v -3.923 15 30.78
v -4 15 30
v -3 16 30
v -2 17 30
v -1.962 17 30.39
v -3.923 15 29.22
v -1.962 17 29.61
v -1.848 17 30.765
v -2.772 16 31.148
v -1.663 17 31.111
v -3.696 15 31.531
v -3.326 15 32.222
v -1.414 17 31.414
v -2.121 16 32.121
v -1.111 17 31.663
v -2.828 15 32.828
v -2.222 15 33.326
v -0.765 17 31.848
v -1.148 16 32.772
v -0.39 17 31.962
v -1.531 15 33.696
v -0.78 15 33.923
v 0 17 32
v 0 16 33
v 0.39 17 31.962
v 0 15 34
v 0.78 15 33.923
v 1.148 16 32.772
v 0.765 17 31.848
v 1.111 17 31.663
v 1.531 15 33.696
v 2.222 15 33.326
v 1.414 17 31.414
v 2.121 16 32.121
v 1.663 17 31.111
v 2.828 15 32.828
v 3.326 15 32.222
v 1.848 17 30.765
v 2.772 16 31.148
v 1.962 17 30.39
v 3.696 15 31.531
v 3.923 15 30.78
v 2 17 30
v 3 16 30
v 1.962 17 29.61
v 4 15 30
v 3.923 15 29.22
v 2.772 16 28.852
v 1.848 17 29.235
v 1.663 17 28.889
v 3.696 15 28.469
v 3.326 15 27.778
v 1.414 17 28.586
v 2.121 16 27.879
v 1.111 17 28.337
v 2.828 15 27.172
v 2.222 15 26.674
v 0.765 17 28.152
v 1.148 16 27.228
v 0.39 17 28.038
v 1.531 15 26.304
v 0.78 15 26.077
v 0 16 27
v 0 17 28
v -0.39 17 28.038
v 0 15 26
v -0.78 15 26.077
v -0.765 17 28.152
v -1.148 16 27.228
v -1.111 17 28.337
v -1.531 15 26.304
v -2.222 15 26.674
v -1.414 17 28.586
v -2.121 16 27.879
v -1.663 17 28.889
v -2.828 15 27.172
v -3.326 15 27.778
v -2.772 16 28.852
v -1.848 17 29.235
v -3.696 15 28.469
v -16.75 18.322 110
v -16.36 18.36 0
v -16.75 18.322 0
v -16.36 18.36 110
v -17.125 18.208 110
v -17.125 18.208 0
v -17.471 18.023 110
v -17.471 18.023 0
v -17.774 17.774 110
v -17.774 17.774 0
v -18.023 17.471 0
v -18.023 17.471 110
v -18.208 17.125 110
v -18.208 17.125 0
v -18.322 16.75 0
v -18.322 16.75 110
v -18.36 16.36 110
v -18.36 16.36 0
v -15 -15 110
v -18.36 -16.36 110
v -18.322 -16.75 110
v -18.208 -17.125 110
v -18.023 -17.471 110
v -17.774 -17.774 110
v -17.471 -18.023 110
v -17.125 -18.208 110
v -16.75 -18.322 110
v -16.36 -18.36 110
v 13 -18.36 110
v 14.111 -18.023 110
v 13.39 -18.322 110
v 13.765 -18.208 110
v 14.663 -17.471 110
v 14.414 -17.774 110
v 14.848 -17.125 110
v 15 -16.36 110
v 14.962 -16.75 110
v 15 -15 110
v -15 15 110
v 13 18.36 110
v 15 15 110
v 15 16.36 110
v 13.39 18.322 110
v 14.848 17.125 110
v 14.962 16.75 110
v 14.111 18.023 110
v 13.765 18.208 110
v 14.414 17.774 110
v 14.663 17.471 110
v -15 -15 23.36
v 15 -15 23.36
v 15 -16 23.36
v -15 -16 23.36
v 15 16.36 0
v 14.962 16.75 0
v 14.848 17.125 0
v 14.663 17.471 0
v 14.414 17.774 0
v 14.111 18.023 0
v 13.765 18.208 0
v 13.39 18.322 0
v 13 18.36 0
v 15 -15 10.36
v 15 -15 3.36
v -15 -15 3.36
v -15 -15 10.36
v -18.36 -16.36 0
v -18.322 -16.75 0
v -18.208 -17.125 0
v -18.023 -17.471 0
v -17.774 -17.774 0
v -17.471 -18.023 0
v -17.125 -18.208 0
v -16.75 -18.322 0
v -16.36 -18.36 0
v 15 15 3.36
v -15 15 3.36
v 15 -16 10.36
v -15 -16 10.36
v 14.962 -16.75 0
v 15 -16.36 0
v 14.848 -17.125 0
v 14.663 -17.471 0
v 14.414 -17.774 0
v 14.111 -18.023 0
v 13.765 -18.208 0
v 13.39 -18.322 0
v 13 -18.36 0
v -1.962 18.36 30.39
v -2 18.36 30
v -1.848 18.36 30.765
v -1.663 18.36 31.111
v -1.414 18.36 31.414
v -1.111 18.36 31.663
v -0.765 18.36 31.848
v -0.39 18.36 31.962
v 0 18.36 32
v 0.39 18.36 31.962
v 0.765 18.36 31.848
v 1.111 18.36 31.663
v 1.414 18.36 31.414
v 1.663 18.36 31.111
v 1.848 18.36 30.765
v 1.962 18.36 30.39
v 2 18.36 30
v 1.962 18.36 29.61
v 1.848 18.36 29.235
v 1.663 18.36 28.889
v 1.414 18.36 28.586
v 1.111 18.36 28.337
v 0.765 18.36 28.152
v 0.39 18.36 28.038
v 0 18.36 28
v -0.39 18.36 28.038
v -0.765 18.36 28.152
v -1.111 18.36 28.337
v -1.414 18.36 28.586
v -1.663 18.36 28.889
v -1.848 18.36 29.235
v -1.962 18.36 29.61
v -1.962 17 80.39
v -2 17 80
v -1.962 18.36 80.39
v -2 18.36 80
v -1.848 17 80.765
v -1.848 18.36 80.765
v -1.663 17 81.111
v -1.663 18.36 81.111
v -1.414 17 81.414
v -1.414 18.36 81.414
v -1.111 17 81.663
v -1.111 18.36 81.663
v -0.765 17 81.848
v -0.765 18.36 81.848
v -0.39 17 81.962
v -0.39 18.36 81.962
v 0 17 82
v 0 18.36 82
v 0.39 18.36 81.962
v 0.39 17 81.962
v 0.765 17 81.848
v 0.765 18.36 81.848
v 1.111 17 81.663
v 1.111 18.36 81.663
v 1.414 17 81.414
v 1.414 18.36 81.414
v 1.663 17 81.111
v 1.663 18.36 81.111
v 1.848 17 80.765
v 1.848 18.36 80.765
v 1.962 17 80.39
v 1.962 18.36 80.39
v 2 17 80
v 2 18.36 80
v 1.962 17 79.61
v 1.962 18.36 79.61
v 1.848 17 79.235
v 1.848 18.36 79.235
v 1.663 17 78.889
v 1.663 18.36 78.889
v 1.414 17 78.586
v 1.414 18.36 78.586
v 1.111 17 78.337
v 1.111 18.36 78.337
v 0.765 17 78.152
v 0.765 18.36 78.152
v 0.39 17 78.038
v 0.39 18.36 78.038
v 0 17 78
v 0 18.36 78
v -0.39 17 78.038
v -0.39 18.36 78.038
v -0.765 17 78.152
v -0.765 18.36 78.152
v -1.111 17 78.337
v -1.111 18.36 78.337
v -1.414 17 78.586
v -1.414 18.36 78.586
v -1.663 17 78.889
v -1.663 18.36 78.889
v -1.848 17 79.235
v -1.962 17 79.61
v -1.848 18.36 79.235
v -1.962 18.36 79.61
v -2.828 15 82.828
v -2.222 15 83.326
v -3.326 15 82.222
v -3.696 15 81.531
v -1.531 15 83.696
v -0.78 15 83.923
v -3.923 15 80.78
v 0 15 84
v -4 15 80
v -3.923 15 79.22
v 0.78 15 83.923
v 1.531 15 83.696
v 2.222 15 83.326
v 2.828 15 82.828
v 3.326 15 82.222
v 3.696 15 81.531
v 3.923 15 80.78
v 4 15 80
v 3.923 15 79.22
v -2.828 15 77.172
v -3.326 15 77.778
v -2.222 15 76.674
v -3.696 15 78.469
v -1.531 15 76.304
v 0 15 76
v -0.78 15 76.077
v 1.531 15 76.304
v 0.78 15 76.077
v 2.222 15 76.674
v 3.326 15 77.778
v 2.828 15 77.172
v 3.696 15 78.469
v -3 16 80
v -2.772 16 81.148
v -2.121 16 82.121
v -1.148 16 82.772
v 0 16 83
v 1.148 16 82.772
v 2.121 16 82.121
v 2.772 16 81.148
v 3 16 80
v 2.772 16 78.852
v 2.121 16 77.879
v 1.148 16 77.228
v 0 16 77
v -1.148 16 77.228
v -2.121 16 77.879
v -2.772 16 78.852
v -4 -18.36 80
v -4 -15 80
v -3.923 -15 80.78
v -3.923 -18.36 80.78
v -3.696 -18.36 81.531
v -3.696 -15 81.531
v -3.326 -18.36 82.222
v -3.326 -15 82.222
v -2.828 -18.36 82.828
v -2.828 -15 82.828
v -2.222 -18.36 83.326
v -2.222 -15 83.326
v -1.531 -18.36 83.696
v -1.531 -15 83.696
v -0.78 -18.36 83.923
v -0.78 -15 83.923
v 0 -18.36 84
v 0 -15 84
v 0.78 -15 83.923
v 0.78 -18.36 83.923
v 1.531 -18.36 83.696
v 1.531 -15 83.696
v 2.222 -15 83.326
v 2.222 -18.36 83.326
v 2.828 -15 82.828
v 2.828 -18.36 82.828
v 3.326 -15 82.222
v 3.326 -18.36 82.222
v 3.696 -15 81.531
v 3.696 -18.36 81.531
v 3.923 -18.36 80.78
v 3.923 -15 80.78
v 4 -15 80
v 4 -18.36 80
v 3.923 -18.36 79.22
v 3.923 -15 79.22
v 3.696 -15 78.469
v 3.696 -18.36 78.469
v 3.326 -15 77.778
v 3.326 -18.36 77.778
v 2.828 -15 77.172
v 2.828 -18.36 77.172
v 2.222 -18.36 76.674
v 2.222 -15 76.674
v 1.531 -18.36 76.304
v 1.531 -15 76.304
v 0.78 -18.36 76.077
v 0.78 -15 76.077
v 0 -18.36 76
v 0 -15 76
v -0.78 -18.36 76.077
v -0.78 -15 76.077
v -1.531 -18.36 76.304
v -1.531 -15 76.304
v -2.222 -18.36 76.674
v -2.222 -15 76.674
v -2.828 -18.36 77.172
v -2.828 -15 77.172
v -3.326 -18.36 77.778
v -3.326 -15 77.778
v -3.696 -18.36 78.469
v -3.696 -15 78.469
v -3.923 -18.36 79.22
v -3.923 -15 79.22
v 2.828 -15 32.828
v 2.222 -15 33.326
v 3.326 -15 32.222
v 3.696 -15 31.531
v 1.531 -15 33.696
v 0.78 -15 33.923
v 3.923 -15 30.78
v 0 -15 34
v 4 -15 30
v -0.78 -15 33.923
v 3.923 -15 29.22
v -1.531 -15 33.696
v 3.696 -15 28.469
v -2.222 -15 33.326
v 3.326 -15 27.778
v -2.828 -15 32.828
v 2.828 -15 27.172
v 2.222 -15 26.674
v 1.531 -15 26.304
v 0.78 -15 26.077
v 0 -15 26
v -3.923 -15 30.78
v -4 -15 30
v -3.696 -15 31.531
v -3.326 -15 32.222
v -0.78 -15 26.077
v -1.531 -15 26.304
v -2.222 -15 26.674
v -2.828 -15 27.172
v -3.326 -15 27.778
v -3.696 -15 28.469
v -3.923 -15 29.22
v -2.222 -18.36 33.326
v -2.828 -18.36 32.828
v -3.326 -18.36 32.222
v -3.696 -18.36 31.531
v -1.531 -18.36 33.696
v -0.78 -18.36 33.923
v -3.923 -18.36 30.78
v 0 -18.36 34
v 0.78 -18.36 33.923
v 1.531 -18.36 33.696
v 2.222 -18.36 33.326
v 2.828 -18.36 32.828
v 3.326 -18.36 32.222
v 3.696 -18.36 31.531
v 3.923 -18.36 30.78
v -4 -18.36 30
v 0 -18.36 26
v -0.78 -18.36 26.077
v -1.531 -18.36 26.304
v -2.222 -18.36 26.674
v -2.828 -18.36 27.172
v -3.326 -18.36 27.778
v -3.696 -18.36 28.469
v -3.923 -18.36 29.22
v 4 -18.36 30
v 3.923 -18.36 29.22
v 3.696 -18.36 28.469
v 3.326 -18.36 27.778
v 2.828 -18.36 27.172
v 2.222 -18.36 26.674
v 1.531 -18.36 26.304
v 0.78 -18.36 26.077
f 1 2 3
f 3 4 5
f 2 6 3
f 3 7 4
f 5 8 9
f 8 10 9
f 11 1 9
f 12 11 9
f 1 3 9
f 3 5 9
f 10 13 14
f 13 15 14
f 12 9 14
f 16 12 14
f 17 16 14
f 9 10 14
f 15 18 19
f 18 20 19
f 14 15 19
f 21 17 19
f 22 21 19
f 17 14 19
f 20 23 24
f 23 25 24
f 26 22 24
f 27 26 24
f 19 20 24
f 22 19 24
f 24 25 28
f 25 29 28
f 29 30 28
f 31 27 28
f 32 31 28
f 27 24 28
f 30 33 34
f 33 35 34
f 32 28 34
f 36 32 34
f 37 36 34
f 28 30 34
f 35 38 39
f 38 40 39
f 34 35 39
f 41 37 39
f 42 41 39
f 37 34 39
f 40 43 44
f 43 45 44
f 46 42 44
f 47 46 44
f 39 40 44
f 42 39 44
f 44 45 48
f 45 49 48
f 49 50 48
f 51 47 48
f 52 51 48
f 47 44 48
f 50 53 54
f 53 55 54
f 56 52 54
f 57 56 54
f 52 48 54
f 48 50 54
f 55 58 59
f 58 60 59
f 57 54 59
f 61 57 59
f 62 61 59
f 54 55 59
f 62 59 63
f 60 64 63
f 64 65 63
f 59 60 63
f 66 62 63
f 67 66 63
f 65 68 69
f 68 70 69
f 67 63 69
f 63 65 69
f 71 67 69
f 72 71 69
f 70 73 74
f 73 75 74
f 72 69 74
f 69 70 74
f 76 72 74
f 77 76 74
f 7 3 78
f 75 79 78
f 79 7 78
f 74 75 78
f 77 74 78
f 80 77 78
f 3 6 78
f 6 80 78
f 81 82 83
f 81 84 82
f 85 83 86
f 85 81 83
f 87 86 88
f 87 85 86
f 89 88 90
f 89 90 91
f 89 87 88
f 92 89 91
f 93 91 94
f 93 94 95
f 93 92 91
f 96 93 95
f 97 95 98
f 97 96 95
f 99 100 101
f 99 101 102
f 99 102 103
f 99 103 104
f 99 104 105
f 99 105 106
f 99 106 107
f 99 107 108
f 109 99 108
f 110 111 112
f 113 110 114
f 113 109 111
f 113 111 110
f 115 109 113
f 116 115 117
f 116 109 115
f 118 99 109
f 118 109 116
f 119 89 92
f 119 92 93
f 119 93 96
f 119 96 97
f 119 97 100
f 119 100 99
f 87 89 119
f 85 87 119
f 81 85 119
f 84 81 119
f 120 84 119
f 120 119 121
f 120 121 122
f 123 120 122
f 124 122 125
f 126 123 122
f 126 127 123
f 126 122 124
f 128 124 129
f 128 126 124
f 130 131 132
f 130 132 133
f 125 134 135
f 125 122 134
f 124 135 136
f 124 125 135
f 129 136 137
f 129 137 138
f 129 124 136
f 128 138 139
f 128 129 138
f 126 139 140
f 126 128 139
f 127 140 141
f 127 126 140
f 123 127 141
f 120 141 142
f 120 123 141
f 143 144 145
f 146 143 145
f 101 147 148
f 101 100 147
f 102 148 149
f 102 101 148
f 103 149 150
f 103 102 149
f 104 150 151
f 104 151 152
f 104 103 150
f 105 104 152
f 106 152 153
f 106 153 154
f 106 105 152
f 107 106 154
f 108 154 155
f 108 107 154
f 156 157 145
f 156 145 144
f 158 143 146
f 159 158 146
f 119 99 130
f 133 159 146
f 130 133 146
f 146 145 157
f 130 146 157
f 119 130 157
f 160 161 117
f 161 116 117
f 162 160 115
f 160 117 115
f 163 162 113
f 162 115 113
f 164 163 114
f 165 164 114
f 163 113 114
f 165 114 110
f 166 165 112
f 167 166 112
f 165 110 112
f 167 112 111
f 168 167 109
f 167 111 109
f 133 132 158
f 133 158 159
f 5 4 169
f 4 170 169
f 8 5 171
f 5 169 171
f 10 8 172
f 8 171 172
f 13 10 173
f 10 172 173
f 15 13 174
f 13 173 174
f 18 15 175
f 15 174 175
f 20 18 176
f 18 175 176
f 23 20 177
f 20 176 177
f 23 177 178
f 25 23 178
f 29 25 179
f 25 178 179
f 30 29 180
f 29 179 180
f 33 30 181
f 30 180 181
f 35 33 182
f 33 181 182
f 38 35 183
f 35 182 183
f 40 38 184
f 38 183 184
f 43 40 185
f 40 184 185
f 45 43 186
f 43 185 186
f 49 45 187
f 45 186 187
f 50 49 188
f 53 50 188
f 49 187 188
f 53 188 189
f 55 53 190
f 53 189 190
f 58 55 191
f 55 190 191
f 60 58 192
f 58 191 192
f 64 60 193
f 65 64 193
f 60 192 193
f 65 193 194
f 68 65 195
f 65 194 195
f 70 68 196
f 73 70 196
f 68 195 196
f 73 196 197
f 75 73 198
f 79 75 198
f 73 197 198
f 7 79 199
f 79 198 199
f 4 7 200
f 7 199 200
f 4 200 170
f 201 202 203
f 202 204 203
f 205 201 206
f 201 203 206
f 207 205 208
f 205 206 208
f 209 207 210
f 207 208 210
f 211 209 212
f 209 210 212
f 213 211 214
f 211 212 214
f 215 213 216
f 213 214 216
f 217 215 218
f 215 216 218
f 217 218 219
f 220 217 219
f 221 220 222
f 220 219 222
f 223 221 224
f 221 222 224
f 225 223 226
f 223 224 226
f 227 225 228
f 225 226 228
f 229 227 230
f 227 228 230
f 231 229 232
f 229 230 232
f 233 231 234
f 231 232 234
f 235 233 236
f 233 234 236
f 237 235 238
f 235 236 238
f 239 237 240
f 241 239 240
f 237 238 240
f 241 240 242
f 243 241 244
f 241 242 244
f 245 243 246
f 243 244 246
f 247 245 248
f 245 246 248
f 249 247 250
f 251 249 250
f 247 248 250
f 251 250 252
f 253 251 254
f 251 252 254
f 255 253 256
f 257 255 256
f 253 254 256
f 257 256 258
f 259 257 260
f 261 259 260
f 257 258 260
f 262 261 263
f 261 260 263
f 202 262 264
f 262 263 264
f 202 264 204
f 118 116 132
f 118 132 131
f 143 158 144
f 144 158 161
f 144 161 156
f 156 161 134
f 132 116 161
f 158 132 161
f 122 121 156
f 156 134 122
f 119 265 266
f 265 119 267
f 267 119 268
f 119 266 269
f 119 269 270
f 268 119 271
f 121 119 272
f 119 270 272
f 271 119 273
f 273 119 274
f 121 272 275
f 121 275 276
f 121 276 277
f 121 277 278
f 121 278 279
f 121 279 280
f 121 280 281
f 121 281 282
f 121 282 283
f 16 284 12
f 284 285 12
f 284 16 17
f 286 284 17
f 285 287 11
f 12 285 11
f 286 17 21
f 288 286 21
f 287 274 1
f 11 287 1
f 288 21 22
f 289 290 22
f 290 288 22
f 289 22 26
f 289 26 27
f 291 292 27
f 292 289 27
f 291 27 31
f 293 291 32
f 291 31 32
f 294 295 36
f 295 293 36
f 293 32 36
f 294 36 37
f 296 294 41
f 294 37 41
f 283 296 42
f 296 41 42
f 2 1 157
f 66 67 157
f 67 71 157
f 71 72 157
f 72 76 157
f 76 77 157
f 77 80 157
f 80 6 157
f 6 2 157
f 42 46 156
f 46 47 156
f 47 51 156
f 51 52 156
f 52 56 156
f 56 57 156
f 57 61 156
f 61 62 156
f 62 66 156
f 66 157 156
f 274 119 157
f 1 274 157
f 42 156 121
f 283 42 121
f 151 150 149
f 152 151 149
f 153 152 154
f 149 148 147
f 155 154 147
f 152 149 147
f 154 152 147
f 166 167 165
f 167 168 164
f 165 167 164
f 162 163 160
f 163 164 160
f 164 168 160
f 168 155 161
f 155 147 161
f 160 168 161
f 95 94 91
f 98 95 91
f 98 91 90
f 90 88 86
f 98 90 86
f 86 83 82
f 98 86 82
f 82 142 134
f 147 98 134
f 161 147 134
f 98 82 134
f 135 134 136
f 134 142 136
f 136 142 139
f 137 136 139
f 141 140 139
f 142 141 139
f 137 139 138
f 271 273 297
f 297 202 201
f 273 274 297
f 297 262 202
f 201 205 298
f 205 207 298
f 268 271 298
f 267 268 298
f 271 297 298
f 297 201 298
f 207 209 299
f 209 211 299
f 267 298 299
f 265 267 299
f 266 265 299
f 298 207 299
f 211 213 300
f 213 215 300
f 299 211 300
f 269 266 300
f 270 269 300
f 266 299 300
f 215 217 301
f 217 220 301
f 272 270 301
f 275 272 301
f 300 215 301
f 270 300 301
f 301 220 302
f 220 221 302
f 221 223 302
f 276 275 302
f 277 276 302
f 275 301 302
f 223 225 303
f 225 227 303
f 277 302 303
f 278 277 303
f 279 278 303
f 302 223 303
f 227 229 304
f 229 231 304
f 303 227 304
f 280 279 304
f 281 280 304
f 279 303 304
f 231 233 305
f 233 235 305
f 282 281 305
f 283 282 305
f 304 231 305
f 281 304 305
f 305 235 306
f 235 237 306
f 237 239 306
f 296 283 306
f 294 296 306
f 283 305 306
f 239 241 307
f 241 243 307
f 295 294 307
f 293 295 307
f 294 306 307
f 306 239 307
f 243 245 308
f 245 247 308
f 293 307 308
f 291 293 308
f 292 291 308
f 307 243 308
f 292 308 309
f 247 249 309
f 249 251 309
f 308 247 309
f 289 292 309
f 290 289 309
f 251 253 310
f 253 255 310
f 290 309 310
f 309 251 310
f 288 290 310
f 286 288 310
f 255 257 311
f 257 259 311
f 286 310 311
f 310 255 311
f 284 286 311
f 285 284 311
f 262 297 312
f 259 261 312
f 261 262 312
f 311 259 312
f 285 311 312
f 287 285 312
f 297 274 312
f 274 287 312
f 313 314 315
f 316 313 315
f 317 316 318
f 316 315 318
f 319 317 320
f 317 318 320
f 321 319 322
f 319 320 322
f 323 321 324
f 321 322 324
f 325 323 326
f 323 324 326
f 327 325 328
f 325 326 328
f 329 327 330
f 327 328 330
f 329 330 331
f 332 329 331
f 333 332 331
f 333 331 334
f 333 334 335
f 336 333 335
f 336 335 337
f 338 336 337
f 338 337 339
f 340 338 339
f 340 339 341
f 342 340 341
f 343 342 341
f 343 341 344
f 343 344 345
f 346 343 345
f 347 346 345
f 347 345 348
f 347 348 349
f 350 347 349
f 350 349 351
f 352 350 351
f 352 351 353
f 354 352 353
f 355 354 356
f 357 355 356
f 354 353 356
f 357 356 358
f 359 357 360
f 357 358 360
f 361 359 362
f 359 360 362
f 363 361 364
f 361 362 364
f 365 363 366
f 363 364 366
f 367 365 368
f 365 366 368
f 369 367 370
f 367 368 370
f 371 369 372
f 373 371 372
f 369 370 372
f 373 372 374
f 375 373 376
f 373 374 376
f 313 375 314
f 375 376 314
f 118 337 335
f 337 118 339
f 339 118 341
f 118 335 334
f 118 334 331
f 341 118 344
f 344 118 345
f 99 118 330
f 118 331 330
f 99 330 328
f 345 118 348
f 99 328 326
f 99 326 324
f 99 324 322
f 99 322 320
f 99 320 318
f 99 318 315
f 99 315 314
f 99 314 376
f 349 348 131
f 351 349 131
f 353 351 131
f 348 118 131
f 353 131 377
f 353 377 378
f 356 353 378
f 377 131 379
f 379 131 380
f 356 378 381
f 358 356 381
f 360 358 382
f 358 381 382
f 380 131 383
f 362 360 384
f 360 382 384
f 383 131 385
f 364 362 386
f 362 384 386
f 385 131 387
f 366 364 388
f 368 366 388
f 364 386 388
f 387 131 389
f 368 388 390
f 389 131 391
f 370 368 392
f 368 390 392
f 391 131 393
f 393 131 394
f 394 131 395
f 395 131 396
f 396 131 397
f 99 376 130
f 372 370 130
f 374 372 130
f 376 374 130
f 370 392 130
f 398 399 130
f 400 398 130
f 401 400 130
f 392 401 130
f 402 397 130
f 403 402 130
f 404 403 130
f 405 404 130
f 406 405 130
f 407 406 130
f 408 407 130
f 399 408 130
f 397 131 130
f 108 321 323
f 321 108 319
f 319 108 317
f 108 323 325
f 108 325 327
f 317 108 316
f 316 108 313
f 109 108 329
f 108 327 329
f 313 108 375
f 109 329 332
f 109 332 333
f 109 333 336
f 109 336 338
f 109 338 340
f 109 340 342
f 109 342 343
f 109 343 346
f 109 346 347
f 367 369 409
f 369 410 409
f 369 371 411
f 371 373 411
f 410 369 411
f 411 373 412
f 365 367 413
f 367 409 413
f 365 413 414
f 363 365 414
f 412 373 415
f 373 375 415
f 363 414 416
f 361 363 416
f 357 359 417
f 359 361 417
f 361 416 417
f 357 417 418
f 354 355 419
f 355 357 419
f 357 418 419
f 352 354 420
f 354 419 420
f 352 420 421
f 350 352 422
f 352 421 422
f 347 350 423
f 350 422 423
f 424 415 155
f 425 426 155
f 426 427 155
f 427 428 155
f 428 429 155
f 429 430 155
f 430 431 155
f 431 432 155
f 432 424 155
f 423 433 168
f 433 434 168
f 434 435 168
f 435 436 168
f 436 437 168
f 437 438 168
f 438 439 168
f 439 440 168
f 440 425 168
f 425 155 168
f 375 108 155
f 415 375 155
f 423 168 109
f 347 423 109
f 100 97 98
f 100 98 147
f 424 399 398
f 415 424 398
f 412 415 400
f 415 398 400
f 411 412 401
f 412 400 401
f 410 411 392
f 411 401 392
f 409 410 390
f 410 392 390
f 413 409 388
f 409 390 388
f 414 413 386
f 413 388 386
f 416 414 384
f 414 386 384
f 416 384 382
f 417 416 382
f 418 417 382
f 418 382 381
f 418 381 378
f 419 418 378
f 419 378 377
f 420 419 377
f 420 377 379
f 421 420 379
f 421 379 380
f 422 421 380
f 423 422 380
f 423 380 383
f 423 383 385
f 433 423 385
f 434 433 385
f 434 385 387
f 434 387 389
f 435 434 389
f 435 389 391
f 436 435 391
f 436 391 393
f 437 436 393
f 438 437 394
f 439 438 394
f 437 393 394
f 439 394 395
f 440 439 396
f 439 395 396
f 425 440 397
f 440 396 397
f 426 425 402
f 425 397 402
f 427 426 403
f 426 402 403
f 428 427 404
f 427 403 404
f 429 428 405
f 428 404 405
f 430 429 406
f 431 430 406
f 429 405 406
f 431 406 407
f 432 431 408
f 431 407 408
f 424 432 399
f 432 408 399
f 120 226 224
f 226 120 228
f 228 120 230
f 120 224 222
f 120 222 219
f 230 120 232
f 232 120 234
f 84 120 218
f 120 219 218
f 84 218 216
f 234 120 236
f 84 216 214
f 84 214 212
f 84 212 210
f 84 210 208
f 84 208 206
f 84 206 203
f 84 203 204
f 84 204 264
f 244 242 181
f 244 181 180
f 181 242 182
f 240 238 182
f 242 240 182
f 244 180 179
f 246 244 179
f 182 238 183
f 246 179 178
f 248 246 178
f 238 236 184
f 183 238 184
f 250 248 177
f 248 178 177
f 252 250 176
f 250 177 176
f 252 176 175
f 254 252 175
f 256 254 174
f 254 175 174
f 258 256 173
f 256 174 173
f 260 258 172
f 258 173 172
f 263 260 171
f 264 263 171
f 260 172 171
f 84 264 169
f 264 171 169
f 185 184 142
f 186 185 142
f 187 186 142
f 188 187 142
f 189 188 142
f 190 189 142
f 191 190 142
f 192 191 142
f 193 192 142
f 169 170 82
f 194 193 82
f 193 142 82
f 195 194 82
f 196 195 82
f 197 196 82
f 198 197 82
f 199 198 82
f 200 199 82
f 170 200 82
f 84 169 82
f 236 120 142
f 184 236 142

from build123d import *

# Parameters (mm, degrees)
F1_DEPTH       = 110
F0_W           = 30
F0_H           = 30
F2_DEPTH       = 3.36
F3_R           = 2
F5_D           = 8
F5_DEPTH       = 4
F7_D           = 4
F7_DEPTH       = 4
F7_CSINK_D     = 8
F7_CSINK_ANGLE = 90
F8_W           = 30
F8_H           = 13
F9_DEPTH       = 1


with BuildPart() as f1:
    # F0 (on Top) → F1 (new body)
    with BuildSketch(Plane.XY):
        Polygon((15, -18.36), (15, -15), (-15, -15), (-15, 15), (15, 15), (15, 18.36), (-18.36, 18.36), (-18.36, -18.36), align=None)
    extrude(amount=F1_DEPTH)

    # F0 (on Top) → F2 (join)
    with BuildSketch(Plane.XY):
        Rectangle(F0_W, F0_H)
    extrude(amount=F2_DEPTH)

    # F3
    f3_edges = [f1.edges().sort_by_distance(p)[0] for p in [
        (-18.36, -18.36, 55),
        (-18.36, 18.36, 55),
        (15, -18.36, 55),
        (15, 18.36, 55),
    ]]
    fillet(f3_edges, radius=F3_R)

    # F5
    with Locations(Plane.XZ.offset(18.36)):
        with Locations((0, 30), (0, 80)):
            Hole(F5_D / 2, depth=F5_DEPTH)

    # F7
    with Locations(Plane.XZ.offset(-15)):
        with Locations((0, 30), (0, 80)):
            CounterSinkHole(F7_D / 2, F7_CSINK_D / 2, depth=F7_DEPTH, counter_sink_angle=F7_CSINK_ANGLE)

    # F8 (on face) → F9 (cut)
    with BuildSketch(Plane(origin=(0, -15, 0), x_dir=(-1, 0, 0), z_dir=(0, 1, 0))):
        with Locations((0, 16.86)):
            Rectangle(F8_W, F8_H)
    extrude(amount=-F9_DEPTH, mode=Mode.SUBTRACT)


solid = f1.part
